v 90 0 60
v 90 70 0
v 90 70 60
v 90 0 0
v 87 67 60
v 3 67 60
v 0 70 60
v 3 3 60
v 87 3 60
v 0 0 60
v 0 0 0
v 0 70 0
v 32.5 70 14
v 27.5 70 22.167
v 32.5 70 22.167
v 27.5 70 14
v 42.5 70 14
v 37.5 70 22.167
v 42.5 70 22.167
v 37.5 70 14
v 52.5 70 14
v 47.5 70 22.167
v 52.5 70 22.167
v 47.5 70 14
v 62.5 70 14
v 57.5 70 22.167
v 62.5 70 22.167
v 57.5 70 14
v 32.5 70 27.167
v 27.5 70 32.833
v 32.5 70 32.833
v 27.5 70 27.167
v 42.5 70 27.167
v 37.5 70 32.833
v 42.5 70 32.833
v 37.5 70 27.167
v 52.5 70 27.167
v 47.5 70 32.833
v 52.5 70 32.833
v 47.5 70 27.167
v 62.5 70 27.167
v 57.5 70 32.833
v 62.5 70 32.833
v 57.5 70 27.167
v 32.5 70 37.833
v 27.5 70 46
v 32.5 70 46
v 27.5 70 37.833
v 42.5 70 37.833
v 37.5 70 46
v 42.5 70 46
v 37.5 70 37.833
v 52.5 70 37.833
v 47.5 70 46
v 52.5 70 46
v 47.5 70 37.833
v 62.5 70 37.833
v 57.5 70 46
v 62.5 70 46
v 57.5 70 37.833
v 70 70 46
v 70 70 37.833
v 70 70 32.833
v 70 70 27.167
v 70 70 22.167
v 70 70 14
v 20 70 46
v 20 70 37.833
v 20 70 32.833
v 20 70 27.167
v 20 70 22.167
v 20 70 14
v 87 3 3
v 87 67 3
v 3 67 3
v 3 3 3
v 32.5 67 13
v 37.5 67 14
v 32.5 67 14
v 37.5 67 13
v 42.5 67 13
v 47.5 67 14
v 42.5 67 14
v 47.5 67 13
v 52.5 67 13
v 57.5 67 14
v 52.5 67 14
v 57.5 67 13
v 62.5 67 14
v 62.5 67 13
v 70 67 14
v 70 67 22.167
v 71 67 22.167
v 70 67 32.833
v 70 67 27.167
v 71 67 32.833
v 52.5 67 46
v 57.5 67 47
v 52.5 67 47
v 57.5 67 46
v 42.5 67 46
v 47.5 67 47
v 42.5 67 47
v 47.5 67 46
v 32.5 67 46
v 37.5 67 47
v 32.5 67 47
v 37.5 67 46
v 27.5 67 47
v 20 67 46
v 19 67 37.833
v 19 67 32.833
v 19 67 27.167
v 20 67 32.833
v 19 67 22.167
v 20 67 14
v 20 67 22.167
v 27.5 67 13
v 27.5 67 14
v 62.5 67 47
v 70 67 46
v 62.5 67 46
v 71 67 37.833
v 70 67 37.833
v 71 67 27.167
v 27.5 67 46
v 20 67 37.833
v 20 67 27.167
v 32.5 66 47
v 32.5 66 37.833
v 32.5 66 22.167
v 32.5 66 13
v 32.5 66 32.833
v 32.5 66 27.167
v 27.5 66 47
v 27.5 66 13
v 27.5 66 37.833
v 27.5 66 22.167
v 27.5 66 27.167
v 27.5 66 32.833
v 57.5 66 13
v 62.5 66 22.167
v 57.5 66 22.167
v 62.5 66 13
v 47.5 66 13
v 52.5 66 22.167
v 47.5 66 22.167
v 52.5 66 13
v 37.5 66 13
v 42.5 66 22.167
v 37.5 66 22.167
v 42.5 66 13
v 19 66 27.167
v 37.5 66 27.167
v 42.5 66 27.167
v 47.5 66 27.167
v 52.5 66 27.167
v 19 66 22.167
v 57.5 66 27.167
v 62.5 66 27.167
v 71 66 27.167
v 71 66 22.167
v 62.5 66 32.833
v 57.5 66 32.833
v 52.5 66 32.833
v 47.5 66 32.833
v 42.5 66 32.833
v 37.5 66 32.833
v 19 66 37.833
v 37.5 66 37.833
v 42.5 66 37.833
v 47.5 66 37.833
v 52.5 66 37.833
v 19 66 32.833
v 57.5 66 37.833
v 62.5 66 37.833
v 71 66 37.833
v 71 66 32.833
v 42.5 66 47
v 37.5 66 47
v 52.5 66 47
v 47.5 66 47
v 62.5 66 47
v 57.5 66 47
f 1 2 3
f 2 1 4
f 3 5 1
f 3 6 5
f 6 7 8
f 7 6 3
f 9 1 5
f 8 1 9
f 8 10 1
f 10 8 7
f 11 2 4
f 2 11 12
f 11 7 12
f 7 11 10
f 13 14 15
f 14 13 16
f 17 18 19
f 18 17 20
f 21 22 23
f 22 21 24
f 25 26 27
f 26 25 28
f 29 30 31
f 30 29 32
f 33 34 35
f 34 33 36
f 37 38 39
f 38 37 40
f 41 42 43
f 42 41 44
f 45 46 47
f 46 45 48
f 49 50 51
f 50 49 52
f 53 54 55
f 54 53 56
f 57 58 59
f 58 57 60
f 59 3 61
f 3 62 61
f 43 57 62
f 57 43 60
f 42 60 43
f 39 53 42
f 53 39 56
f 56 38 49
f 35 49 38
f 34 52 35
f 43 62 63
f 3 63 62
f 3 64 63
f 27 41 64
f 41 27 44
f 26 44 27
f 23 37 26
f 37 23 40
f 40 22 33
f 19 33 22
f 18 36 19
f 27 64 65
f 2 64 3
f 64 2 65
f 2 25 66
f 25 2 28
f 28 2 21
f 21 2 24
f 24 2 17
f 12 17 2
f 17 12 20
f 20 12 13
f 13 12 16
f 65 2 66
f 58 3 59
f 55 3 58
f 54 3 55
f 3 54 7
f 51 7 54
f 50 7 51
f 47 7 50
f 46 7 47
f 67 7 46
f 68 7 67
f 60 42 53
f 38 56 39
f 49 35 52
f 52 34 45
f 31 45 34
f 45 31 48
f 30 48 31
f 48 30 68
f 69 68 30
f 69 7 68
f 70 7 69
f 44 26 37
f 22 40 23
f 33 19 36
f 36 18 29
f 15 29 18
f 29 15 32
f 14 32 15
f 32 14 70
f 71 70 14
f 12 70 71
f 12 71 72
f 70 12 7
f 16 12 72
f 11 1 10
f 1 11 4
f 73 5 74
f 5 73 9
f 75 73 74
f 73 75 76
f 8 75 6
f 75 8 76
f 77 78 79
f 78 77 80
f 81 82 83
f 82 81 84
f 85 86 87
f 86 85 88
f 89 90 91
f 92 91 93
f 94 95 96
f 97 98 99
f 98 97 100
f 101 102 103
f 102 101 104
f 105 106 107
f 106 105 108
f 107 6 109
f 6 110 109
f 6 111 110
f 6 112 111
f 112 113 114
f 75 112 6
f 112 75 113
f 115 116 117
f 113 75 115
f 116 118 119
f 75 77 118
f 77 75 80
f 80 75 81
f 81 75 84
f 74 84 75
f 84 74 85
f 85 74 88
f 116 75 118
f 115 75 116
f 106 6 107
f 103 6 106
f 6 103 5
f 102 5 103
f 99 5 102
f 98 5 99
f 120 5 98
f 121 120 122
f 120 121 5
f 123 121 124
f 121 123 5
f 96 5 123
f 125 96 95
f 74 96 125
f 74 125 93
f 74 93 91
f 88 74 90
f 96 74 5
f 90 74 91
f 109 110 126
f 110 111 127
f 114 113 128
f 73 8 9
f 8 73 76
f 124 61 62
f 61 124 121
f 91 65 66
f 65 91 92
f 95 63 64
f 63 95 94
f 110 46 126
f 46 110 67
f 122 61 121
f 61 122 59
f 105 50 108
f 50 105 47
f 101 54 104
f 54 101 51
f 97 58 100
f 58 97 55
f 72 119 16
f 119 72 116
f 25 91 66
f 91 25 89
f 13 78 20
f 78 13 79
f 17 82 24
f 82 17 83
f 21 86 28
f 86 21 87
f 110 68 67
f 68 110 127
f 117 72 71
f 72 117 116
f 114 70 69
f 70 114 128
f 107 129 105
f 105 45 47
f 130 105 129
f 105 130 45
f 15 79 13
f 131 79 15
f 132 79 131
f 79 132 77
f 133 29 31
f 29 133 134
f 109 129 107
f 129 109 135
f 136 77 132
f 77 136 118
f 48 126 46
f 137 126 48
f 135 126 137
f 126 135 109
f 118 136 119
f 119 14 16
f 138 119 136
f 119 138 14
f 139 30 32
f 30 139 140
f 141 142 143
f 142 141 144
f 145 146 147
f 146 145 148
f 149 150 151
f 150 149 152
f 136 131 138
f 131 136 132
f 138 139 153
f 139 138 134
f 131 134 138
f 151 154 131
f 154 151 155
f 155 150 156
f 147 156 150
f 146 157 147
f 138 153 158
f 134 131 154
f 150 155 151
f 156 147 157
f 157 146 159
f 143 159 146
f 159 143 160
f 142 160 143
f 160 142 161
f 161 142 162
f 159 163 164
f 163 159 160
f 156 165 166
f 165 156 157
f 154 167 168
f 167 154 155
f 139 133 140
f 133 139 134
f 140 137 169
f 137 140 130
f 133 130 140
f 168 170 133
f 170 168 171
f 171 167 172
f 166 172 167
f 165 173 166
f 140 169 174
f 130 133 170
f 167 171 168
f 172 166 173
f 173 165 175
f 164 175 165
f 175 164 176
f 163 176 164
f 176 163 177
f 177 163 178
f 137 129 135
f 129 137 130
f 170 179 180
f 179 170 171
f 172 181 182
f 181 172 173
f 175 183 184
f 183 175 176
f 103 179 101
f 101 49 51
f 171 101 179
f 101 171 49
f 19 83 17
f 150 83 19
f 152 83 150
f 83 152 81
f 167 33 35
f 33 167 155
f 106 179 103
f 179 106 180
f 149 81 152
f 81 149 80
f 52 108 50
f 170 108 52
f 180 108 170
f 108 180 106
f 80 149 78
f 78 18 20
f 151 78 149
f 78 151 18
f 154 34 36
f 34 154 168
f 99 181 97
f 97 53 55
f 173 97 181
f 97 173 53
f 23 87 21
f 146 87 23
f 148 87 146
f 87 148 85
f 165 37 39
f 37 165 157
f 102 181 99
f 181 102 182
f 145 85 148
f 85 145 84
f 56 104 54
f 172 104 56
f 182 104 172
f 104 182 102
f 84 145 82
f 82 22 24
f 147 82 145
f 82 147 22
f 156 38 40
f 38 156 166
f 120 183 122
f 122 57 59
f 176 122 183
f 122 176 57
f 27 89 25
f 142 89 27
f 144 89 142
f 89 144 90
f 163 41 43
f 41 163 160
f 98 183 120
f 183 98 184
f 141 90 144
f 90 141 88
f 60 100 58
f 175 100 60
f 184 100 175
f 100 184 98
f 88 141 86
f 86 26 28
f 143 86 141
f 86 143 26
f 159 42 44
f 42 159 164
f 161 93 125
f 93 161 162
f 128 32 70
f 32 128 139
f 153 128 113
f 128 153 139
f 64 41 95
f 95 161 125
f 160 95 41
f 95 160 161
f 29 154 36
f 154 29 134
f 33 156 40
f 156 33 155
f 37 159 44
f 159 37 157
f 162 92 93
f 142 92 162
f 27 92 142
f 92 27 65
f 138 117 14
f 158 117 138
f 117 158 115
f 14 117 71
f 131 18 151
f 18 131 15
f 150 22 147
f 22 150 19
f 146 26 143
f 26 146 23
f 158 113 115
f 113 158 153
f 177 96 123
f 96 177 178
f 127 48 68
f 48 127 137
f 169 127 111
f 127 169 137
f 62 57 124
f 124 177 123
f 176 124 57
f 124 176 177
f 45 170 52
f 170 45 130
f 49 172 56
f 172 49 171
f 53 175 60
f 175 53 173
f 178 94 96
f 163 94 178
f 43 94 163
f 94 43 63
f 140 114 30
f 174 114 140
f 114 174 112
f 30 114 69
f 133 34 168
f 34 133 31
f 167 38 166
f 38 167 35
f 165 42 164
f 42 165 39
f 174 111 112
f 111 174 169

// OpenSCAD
$fn = 32;

// ----------------------------------------------------------------------
// Vent box: crossgrid enclosure
// ----------------------------------------------------------------------

// --- parameters (mm) ---
box_l = 90;               // box length, X
box_w = 70;               // box width, Y
box_h = 60;               // box height, Z
wall_t = 3;               // shell wall thickness
win_l = 50;               // vent window width, X
win_h = 32;               // vent window height, Z
bar_w = 5;                // grid bar width
n_v = 4;                  // vertical bar count
n_h = 2;                  // horizontal bar count

win_z0 = (box_h - win_h) / 2;  // window lower edge Z
v_step = win_l / (n_v + 1);  // vertical bar step
h_step = win_h / (n_h + 1);  // horizontal bar step

difference() {
  union() {
    difference() {
      cube([box_l, box_w, box_h]);
  translate([wall_t, wall_t, wall_t])
    cube([box_l - 2 * wall_t, box_w - 2 * wall_t, box_h]);
  translate([(box_l - win_l) / 2, box_w - wall_t - 1, win_z0])
    cube([win_l, wall_t + 2, win_h]);
    }
    for (i = [1 : n_v])
      translate([(box_l - win_l) / 2 + i * v_step - bar_w / 2,
                 box_w - wall_t - 1, win_z0 - 1])
        cube([bar_w, wall_t + 1, win_h + 2]);
    for (i = [1 : n_h])
      translate([(box_l - win_l) / 2 - 1, box_w - wall_t - 1,
                 win_z0 + i * h_step - bar_w / 2])
        cube([win_l + 2, wall_t + 1, bar_w]);
  }
}
